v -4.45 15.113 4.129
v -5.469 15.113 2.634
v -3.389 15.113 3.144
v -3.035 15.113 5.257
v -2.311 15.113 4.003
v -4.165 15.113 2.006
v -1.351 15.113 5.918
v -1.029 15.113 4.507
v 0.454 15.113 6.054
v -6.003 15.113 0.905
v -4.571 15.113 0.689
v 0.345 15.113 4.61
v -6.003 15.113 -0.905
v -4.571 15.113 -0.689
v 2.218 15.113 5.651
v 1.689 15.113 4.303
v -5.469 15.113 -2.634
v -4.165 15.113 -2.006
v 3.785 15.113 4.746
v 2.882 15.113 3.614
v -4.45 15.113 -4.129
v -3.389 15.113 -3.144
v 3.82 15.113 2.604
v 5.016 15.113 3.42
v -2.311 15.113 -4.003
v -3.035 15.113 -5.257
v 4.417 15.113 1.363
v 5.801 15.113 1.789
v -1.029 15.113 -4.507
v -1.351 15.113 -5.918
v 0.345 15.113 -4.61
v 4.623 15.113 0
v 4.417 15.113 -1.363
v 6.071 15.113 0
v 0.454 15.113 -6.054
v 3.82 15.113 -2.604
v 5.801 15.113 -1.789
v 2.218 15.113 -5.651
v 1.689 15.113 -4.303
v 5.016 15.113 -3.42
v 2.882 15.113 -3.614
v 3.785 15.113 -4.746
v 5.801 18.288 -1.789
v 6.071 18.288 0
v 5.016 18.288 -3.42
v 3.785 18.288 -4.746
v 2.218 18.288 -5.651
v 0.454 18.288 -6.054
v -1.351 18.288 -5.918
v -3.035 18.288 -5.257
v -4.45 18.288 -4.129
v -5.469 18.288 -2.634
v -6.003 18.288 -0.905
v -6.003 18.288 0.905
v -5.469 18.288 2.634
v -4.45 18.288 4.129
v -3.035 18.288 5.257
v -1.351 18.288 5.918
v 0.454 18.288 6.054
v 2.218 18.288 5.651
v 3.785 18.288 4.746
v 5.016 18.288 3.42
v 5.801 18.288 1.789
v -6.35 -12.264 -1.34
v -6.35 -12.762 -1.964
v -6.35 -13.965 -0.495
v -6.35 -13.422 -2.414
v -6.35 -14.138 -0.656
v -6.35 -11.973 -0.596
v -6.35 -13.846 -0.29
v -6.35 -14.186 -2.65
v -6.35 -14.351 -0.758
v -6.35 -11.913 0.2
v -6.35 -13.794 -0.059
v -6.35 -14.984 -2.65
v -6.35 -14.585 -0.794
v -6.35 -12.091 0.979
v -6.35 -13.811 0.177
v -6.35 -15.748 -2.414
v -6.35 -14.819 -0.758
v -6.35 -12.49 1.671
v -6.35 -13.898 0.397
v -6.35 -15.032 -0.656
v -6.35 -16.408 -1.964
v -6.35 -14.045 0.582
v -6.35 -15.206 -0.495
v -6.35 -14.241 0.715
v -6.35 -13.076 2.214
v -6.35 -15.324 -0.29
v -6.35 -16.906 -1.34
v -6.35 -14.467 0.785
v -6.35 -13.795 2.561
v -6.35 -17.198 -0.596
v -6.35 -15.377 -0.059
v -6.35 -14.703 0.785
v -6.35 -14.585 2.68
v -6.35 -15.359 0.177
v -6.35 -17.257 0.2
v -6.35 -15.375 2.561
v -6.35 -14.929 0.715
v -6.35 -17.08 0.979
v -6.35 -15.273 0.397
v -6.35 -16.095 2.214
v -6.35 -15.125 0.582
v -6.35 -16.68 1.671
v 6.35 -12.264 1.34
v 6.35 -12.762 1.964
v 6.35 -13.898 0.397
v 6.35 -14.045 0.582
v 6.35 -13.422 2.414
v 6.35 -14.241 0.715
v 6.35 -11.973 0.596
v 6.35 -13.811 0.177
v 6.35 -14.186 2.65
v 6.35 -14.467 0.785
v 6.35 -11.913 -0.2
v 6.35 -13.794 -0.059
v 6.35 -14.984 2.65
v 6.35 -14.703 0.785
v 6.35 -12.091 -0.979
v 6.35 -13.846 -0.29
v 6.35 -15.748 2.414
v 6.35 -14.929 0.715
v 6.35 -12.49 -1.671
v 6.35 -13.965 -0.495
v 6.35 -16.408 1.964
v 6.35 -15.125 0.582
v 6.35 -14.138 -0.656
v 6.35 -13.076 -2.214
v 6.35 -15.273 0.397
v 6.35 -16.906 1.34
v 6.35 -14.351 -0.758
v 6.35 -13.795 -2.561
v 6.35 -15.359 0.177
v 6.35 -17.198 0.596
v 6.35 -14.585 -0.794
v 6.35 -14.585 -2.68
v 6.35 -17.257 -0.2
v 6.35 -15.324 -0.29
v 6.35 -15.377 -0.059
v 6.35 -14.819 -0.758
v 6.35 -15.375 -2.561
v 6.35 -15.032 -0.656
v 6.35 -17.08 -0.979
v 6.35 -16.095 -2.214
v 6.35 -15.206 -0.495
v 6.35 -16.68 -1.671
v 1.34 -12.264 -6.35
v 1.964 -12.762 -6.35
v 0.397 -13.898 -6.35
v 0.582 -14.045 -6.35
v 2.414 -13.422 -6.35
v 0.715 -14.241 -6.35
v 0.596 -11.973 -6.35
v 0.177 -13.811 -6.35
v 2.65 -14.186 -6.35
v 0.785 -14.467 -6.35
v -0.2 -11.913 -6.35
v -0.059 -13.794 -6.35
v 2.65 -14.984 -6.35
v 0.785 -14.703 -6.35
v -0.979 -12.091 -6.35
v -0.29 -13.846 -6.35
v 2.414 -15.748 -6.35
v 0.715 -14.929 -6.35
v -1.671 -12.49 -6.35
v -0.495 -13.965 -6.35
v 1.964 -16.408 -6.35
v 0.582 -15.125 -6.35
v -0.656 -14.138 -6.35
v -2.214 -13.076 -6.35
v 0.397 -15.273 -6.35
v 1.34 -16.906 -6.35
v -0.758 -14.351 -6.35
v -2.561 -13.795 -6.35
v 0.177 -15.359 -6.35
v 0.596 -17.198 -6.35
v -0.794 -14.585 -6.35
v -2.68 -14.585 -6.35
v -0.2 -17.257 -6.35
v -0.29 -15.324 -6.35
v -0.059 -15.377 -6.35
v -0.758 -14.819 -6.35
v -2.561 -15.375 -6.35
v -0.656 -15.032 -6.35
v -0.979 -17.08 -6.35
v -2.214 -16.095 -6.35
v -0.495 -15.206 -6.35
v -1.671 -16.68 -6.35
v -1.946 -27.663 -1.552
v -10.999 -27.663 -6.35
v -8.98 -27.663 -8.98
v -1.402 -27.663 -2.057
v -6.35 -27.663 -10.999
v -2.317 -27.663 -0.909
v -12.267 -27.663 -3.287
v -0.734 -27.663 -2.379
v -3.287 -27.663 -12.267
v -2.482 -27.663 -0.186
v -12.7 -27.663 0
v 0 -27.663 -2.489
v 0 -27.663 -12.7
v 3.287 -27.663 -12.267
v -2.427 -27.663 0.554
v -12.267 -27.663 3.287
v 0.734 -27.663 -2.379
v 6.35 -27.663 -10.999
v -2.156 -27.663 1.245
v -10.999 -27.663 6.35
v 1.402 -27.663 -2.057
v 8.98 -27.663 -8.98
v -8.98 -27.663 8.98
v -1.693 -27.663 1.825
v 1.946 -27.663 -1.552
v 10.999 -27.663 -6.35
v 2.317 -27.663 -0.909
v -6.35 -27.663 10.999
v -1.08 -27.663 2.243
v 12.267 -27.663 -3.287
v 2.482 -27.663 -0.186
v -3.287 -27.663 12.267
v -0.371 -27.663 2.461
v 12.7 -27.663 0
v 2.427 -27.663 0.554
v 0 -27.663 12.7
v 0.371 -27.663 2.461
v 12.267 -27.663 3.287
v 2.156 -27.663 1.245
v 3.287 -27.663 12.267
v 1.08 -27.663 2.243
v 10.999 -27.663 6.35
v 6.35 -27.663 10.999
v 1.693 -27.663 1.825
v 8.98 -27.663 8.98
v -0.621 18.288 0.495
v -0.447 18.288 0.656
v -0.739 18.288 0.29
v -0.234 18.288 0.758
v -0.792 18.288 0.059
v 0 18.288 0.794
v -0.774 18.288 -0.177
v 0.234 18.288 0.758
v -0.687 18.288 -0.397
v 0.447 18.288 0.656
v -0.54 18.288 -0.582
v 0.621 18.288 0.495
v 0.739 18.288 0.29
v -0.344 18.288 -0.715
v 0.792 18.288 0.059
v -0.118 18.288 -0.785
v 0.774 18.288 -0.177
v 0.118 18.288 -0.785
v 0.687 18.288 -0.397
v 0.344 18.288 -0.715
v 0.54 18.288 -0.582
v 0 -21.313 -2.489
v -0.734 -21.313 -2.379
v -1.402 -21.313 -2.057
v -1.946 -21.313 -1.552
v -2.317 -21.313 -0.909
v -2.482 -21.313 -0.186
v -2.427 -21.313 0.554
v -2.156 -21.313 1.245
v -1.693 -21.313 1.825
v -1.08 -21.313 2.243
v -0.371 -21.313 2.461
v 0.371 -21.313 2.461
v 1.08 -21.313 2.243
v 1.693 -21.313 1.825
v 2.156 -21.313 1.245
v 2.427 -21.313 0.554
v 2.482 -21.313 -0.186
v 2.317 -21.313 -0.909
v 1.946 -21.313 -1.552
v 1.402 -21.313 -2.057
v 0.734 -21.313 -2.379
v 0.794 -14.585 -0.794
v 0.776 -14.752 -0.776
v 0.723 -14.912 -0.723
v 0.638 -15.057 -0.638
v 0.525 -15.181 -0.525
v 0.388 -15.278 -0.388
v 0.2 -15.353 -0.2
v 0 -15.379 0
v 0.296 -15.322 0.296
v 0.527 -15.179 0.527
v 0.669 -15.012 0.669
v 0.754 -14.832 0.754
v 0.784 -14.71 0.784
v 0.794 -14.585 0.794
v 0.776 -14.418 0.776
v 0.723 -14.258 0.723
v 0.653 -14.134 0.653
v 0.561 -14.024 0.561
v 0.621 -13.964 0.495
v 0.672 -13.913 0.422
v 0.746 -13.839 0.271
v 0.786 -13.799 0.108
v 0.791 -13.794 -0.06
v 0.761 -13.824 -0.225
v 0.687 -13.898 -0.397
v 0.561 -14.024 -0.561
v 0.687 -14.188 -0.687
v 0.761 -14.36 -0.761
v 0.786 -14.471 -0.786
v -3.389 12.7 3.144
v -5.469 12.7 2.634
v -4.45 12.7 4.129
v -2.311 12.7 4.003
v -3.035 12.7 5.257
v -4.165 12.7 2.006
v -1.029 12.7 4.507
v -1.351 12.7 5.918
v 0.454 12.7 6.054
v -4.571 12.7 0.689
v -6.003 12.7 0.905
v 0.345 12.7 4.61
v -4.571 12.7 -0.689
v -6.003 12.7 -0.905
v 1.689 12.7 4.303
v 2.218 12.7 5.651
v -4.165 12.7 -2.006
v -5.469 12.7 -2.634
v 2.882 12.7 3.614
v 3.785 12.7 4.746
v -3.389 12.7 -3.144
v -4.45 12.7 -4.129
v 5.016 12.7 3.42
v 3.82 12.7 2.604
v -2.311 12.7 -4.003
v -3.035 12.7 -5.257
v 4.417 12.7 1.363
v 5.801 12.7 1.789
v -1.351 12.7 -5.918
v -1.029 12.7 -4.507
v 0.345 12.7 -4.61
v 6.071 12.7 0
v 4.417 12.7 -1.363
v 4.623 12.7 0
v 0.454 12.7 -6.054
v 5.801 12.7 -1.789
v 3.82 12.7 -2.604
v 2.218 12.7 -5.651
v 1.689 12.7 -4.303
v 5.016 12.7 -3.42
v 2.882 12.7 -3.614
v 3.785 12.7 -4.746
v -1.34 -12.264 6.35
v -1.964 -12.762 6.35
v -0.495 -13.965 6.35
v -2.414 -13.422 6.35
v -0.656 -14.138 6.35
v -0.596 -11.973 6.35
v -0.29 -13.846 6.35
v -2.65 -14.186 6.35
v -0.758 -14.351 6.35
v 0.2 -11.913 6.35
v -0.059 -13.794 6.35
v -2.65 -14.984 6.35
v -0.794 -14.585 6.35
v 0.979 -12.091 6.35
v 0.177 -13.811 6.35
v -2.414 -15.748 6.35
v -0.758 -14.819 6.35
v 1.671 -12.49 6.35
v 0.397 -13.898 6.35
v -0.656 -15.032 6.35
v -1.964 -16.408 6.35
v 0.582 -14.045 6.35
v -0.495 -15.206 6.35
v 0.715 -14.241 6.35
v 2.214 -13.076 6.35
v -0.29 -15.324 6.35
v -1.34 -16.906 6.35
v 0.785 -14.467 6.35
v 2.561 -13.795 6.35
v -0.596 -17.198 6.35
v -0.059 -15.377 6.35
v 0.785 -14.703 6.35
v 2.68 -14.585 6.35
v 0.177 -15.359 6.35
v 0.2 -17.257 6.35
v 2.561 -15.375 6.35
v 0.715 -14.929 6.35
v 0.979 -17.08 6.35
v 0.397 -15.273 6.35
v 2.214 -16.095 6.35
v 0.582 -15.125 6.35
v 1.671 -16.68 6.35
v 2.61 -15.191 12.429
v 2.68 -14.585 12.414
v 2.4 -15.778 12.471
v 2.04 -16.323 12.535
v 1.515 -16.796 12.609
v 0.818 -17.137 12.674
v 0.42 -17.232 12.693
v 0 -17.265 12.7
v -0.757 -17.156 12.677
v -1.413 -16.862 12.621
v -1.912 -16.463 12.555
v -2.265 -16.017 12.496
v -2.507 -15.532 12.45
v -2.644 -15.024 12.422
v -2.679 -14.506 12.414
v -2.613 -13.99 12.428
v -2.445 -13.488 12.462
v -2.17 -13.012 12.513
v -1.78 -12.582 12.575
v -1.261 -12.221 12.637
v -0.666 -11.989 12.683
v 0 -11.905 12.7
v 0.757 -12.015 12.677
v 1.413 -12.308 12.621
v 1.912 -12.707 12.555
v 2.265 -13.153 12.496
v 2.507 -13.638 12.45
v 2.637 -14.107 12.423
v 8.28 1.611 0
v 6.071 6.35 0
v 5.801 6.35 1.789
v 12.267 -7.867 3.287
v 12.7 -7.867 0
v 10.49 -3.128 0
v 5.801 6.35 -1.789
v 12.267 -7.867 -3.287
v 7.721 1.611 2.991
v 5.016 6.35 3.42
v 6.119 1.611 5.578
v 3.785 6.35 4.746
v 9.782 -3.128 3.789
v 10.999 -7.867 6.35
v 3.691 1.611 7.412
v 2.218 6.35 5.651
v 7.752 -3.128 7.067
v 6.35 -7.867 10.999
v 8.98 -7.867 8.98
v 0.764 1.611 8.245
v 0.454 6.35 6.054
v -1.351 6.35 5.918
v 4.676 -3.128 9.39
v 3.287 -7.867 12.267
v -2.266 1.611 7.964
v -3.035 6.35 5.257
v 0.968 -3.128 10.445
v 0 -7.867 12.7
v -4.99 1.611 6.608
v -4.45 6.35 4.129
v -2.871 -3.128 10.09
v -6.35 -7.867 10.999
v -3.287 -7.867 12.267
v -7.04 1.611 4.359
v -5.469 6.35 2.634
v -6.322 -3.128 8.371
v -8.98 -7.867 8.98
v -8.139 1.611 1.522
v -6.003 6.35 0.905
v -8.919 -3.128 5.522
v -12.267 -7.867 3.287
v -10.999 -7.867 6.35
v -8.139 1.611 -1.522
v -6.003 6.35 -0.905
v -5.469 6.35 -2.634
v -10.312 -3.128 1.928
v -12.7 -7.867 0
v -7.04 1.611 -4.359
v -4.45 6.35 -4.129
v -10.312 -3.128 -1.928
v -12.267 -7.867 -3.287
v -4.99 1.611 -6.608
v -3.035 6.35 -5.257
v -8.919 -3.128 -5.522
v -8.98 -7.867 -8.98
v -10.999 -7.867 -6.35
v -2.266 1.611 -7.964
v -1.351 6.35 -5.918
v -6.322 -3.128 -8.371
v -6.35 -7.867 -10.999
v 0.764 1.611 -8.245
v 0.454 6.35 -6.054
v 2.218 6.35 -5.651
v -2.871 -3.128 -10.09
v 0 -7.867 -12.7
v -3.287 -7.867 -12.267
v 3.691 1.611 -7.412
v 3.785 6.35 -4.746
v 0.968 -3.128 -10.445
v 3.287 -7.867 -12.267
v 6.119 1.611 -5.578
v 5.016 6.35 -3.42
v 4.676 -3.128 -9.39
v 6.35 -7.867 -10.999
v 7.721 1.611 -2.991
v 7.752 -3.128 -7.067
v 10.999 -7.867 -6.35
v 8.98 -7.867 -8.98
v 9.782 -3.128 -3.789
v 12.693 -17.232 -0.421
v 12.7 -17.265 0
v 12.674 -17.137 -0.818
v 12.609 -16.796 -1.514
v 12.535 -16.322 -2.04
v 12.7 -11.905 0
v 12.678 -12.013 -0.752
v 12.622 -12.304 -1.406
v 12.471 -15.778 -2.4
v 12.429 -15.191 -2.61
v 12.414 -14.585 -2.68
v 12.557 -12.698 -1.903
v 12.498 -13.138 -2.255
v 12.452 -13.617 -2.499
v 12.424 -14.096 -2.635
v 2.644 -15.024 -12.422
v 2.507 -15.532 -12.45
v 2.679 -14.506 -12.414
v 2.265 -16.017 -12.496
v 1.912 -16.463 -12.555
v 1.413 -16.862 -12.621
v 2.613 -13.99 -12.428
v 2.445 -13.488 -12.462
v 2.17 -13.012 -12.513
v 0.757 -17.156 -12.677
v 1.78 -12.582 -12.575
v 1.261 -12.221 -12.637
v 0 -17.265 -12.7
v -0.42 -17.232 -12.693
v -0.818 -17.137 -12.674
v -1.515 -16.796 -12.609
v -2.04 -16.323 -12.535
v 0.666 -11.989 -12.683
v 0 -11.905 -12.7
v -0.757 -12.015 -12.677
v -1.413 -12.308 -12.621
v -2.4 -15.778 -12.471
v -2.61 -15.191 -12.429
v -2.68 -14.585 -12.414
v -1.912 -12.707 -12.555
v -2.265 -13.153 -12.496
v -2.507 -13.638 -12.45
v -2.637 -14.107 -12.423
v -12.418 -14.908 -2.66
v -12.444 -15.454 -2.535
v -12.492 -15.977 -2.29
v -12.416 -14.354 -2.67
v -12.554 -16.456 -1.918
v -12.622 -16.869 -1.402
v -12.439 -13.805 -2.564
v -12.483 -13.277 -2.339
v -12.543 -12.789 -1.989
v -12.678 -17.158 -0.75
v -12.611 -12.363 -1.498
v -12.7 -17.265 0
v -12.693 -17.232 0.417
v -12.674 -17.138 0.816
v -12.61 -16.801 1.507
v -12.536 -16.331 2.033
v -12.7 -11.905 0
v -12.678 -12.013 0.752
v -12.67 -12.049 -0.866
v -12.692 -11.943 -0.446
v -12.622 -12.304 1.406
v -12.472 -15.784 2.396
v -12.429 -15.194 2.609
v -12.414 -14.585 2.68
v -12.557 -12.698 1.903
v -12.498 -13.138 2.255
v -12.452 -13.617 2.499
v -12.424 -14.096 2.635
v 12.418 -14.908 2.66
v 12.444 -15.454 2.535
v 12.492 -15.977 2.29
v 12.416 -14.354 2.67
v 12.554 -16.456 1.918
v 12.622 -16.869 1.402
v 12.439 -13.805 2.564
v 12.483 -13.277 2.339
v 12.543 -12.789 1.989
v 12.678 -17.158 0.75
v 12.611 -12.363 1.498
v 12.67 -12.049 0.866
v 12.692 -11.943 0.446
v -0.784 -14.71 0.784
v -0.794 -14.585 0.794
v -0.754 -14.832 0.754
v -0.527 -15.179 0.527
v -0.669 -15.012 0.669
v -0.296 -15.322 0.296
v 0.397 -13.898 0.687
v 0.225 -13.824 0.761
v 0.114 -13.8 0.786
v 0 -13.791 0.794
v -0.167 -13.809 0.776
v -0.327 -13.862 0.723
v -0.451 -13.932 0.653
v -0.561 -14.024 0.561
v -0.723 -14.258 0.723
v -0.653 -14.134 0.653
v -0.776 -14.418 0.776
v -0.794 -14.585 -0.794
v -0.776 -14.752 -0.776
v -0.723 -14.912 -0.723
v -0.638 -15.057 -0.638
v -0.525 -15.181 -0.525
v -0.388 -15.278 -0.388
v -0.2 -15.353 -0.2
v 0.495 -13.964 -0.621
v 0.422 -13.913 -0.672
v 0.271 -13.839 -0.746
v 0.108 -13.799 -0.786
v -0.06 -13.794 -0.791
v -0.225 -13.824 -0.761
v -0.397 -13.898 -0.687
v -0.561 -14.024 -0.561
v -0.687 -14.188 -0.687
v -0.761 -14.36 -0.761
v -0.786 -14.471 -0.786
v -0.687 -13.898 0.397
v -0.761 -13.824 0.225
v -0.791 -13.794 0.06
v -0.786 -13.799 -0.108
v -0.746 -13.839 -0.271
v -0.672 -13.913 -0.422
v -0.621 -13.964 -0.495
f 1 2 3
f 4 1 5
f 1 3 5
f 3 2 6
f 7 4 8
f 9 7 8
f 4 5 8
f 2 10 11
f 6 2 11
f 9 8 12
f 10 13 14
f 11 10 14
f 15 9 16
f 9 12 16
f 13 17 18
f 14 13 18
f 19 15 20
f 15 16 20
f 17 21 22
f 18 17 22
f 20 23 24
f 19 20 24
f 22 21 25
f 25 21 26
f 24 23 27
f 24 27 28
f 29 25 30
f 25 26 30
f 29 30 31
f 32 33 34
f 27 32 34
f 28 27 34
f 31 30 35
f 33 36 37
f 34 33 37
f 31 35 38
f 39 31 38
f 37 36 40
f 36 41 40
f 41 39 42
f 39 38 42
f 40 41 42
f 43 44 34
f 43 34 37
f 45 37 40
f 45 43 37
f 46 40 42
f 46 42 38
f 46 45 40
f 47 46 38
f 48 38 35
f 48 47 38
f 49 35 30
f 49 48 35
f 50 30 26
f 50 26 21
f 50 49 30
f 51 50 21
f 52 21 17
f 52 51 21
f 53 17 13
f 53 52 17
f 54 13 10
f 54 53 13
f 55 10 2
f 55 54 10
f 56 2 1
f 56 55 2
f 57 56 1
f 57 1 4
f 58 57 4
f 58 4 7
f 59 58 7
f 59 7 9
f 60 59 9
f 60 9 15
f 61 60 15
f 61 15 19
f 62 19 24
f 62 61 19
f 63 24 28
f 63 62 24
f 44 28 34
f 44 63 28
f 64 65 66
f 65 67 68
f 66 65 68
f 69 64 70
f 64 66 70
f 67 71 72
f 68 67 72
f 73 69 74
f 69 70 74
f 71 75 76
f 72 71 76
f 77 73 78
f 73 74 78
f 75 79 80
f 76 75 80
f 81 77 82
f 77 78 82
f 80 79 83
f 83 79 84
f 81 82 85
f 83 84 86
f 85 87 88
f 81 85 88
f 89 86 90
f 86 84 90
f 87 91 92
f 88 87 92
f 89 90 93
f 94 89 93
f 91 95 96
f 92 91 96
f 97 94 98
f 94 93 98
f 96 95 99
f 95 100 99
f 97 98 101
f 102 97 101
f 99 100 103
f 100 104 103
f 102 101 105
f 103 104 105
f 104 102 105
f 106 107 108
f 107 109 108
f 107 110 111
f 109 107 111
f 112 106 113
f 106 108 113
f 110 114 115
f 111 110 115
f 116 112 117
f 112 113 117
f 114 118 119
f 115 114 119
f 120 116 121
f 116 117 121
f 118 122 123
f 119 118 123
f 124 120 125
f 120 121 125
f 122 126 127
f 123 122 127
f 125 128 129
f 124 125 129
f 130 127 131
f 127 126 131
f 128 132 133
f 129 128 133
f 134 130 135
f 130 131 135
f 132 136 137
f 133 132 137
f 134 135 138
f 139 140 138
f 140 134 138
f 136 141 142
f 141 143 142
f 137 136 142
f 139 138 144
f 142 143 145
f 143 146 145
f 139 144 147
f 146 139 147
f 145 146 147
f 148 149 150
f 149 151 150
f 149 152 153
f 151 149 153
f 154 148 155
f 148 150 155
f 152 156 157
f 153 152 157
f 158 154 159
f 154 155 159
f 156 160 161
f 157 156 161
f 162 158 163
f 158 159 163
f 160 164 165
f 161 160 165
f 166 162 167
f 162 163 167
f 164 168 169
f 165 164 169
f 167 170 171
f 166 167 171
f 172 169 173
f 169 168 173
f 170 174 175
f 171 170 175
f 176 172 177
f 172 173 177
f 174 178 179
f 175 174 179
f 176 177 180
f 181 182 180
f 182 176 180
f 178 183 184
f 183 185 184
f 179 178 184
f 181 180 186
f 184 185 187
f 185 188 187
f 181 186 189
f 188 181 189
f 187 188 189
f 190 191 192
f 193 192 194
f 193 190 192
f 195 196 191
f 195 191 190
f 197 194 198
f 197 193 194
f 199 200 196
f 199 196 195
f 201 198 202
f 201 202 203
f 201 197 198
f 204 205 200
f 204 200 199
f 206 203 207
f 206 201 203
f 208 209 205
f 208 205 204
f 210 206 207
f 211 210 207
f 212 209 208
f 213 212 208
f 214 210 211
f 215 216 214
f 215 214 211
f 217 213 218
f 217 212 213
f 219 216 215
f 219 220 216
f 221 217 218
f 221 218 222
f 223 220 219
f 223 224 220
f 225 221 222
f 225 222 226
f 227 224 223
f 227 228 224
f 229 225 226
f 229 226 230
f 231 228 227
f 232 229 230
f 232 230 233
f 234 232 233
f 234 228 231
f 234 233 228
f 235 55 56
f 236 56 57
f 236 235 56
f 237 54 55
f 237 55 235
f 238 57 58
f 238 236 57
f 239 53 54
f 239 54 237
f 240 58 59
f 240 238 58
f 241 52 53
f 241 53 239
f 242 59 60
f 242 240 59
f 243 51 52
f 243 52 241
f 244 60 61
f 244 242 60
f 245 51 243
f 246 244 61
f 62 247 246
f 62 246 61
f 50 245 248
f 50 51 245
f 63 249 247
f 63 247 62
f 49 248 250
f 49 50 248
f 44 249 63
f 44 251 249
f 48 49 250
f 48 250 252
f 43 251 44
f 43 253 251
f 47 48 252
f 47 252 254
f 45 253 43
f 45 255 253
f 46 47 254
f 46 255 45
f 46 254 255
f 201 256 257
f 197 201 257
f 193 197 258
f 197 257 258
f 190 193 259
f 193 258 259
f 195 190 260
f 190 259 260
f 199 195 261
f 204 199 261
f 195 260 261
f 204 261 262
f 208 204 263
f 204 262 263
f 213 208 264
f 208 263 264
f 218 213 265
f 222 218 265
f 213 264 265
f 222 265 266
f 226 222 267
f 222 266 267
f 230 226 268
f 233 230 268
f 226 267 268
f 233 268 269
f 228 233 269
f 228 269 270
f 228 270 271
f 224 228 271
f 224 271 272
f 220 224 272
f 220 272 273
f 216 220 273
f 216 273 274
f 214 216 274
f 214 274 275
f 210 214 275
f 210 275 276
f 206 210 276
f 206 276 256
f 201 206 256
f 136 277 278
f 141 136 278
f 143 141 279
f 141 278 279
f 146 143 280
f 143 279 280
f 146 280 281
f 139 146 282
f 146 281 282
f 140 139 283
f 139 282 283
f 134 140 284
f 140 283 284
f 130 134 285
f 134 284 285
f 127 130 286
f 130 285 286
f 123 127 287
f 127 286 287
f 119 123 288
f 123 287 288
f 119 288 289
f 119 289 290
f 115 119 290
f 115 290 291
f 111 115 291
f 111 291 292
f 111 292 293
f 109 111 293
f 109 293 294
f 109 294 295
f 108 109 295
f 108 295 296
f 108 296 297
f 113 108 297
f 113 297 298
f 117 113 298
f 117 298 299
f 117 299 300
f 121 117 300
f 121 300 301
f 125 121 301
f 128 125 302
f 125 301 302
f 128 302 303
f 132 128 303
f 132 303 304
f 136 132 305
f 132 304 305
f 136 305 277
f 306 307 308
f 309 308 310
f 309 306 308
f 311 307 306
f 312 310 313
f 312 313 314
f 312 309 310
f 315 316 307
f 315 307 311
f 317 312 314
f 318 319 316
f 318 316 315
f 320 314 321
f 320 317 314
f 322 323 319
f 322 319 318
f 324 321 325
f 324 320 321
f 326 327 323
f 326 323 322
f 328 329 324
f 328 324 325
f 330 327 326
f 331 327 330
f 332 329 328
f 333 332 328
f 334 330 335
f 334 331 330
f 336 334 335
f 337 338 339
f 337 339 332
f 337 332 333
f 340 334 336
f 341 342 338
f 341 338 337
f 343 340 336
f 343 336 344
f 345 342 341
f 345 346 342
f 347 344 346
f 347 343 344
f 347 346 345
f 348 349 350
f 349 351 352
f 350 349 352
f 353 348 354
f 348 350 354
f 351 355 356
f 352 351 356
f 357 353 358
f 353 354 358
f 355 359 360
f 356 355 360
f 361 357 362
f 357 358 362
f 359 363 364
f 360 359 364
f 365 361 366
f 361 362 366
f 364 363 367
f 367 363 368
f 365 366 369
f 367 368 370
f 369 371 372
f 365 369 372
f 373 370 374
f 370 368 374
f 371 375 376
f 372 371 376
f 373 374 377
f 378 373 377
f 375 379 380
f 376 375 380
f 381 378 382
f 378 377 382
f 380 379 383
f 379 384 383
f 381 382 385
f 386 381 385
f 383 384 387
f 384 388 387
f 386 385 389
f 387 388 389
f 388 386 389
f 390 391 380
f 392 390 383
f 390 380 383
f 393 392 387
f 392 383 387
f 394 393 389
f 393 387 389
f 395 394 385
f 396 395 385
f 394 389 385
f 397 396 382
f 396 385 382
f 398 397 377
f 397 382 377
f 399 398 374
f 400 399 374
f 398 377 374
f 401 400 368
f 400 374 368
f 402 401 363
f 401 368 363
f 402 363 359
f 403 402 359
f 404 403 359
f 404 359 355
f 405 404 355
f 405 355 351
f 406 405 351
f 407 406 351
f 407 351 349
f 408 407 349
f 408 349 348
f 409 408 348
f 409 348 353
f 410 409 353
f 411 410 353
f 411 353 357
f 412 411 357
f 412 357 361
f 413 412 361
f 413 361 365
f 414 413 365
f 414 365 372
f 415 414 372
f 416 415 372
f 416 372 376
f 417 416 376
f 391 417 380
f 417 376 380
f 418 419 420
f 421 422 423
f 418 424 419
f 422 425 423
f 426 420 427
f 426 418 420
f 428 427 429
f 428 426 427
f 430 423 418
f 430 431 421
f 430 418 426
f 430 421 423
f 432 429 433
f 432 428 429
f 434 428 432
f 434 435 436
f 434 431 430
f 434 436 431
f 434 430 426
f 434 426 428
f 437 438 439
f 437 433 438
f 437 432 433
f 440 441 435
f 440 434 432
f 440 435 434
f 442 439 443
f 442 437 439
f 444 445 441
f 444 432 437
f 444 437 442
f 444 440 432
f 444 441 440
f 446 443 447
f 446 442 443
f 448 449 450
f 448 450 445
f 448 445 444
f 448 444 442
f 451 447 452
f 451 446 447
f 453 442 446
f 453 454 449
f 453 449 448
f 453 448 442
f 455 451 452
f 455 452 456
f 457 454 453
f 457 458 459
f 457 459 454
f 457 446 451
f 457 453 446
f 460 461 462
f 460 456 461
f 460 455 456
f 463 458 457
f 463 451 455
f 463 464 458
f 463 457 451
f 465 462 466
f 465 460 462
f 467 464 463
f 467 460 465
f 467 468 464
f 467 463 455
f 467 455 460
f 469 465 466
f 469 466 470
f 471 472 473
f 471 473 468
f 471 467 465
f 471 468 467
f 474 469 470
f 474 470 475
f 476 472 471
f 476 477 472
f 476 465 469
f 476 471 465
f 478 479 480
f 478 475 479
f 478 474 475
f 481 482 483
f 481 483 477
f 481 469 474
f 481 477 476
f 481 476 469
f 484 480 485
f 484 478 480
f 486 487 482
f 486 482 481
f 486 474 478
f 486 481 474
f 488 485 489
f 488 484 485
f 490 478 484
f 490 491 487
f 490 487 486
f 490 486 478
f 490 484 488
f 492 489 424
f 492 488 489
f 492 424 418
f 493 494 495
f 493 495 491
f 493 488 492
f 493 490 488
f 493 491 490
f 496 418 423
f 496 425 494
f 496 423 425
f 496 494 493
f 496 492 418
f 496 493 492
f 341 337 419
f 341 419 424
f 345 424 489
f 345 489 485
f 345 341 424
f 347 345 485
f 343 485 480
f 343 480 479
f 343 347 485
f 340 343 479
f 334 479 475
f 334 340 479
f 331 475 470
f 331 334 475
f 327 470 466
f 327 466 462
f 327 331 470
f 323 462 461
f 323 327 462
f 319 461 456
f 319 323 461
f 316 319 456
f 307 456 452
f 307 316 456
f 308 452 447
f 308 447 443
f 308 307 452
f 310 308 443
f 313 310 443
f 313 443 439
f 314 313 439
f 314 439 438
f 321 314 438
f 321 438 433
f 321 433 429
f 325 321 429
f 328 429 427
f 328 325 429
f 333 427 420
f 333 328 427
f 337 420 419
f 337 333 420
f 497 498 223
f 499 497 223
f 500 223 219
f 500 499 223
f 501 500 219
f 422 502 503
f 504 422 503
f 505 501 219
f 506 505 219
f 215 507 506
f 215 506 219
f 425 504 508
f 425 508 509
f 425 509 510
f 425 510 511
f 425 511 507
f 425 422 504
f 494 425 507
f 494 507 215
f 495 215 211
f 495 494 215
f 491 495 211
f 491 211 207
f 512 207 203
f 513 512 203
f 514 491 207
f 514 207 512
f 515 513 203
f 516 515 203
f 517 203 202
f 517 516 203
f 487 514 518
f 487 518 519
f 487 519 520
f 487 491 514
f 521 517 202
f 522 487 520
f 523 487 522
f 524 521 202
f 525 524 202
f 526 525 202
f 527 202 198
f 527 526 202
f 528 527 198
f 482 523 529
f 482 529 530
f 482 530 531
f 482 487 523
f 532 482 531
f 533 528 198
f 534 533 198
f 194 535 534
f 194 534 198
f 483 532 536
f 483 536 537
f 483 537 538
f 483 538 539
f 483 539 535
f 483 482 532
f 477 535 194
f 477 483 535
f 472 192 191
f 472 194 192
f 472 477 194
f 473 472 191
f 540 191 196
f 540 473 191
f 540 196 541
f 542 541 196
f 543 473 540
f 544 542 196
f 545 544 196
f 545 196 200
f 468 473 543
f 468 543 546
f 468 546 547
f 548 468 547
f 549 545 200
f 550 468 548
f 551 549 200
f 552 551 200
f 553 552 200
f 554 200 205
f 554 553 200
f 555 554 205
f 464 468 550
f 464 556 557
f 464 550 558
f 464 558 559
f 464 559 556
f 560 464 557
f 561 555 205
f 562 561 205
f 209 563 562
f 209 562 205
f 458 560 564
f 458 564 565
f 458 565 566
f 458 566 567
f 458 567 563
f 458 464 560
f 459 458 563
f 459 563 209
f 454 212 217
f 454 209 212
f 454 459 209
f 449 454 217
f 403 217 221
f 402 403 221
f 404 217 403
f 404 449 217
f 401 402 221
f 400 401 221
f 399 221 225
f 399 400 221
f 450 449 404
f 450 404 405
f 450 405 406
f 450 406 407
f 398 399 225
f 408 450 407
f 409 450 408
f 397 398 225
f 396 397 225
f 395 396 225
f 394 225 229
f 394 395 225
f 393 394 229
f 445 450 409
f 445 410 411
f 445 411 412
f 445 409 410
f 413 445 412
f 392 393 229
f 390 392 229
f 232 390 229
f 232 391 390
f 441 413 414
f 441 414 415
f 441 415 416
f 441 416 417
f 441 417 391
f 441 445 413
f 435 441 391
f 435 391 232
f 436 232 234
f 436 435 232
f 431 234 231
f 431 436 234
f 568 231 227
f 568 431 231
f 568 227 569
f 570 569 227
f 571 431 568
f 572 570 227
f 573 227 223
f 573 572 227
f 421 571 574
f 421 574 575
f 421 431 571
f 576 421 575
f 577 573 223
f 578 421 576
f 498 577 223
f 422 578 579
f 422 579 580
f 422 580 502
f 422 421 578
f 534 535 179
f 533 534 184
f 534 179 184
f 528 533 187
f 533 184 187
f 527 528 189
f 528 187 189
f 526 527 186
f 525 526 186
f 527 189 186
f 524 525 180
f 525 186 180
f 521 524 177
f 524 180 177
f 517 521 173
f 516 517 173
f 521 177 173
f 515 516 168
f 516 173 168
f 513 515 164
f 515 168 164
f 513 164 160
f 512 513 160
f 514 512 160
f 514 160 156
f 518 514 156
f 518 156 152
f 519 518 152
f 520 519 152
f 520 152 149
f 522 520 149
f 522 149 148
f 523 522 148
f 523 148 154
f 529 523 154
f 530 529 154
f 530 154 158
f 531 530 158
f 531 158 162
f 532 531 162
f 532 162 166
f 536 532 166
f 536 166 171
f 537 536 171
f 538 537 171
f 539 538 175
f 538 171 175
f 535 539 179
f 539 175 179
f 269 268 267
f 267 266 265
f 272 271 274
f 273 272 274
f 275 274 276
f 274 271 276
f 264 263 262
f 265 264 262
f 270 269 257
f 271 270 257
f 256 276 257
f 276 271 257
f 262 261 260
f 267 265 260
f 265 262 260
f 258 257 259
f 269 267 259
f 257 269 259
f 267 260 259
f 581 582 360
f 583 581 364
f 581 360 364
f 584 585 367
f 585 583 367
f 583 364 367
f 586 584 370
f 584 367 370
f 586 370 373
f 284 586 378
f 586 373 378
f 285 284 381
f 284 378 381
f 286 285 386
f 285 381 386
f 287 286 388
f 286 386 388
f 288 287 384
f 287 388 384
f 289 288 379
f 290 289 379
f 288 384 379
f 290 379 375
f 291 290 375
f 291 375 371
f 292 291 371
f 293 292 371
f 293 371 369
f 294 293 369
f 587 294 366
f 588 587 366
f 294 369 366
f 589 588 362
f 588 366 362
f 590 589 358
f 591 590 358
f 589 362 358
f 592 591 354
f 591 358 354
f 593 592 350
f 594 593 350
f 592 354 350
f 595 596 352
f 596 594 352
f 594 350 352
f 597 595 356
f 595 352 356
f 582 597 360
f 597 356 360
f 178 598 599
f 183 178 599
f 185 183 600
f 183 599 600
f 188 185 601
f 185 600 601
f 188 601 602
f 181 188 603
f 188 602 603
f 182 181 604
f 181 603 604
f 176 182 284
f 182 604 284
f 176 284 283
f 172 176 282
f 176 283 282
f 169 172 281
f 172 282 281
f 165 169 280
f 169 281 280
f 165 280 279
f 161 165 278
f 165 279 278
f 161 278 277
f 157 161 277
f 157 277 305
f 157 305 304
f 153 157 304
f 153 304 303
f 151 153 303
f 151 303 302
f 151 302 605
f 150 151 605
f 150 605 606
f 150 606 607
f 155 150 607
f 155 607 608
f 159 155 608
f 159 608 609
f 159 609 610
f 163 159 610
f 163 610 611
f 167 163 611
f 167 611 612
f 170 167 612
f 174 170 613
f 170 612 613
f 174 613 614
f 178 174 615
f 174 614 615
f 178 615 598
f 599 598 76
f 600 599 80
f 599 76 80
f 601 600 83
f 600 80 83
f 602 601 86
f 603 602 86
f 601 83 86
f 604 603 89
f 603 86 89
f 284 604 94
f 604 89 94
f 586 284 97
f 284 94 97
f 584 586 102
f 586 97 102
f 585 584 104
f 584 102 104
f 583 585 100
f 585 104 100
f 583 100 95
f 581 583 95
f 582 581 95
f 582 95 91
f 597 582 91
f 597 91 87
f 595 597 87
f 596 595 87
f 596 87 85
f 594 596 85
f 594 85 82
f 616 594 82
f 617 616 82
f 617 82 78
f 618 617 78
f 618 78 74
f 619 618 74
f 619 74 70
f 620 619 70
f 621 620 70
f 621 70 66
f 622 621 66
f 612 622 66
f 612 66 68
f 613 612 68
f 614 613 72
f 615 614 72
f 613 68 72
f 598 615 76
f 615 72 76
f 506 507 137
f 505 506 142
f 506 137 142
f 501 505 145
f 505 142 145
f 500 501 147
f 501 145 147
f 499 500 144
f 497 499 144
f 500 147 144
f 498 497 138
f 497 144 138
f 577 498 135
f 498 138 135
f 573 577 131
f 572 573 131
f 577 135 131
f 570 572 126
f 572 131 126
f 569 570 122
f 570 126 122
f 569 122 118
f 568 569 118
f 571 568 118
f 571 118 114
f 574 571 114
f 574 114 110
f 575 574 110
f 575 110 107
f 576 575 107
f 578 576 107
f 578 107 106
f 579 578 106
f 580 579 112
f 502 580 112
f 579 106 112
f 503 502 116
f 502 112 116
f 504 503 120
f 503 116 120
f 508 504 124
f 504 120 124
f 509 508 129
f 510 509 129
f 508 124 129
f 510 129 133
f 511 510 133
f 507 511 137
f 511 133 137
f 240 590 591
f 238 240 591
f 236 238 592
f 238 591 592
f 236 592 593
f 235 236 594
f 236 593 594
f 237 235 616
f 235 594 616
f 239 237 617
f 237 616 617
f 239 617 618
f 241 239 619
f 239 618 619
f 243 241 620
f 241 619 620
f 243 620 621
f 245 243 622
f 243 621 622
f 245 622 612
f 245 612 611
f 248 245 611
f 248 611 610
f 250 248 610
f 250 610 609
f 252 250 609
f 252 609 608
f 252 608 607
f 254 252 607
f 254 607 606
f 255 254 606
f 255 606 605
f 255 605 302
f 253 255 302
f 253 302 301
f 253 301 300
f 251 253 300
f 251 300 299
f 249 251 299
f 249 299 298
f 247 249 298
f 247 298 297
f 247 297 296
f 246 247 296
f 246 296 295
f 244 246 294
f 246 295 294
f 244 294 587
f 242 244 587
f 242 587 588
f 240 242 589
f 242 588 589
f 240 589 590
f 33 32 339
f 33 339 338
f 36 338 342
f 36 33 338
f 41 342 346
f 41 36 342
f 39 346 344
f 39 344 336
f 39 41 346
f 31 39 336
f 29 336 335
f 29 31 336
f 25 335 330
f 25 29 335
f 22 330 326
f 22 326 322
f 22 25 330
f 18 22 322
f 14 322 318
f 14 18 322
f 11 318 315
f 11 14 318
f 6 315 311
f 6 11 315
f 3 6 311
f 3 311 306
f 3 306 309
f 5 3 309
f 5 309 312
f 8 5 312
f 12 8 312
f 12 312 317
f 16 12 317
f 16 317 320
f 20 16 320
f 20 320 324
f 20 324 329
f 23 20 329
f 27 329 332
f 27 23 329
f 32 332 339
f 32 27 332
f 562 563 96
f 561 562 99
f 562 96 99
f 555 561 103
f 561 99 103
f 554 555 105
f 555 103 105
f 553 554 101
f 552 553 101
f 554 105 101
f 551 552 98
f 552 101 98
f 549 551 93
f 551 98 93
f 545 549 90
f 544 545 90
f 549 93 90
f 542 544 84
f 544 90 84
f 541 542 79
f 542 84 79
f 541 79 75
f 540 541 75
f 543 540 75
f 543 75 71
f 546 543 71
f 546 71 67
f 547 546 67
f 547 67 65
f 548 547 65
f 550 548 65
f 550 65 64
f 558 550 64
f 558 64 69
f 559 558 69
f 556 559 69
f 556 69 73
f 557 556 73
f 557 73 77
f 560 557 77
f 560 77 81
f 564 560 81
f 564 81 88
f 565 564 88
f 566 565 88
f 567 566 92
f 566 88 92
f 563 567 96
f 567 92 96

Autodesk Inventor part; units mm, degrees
ref_plane "YZ Plane" through (0, 0, 0) normal (1, 0, 0) x (0, 1, 0)
ref_plane "XZ Plane" through (0, 0, 0) normal (0, 1, 0) x (-1, 0, 0)
ref_plane "XY Plane" through (0, 0, 0) normal (0, 0, 1) x (1, 0, 0)
sketch "Sketch1" plane through (0, 0, 0) normal (0, 0, 1) x (1, 0, 0)
  line L0 (0, 0) -> (6.0706, 0)
  line L1 (6.0706, 0) -> (6.0706, 12.7)
  line L2 (6.0706, 12.7) -> (4.6228, 12.7)
  line L3 (4.6228, 12.7) -> (4.6228, 15.113)
  line L4 (4.6228, 15.113) -> (6.0706, 15.113)
  line L5 (6.0706, 15.113) -> (6.0706, 18.288)
  line L6 (6.0706, 18.288) -> (0, 18.288)
  line L7 (0, 18.288) -> (0, 0)
  line L8 (0, -29.2334) -> (0, 26.2082) projected
  line L9 (6.0706, 0) -> (6.0706, 6.35)
  line L10 (6.0706, 0) -> (6.0706, 6.35)
  line L11 (6.0706, 6.35) -> (13.048, -8.6131)
  line L12 (6.0706, 6.35) -> (22.5806, 6.35) construction
  line L13 (13.048, -8.6131) -> (9.873, -8.6131)
  line L14 (9.873, -8.6131) -> (6.0706, 0)
  line L15 (13.048, -8.6131) -> (0, -8.6131)
  line L16 (0, 0) -> (6.0706, 0)
  line L17 (0, -8.6131) -> (12.7, -8.6131)
  line L18 (12.7, -8.6131) -> (12.7, -21.3131)
  line L19 (12.7, -21.3131) -> (0, -21.3131)
  line L20 (0, -21.3131) -> (0, -8.6131)
  line L21 (12.7, -8.6131) -> (12.7, -7.8668)
  dimension "d0" = 6.0706
  dimension "d1" = 12.7
  dimension "d2" = 90
  dimension "d3" = 1.4478
  dimension "d4" = 2.413
  dimension "d5" = 3.175
  dimension "d23" = 16.51
  dimension "d24" = 65
  dimension "d25" = 3.175
  dimension "d83" = 12.7
  dimension "d84" = 12.7
revolve "Revolution1" add sketch "Sketch1" angle 360 about axis through (0, -10, 0) along (0, 1, 0) contours L7 L6 L5 L4 L3 L2 L1 L0 | L0 L14 L15 L8 | L1 L11 L21 L13 L14 | L15 L13 L18 L19 L8
sketch "Sketch12" plane through (0, 18.288, 0) normal (0, 1, 0) x (1, 0, 0)
  point P0 (0, 0)
  point P1 (0, 0)
hole "Hole4" at (0, 18.288, 0) direction (0, -1, 0) diameter 1.5875 depth 32.8676 tip angle 118
sketch "Sketch13" plane through (0, -21.3131, 0) normal (0, -1, 0) x (1, 0, 0)
  circle A0 centre (0, 0) radius 12.7 projected
  point P0 (12.7, 0)
  point P1 (0, -12.7)
  point P2 (-12.7, 0)
  point P3 (0, 12.7)
ref_plane "Work Plane1" through (12.7, -21.3131, 0) normal (1, 0, 0) x (0, 1, 0)
sketch "Sketch14" plane through (12.7, -21.3131, 0) normal (1, 0, 0) x (0, 1, 0)
  line L0 (0, 12.7) -> (0, -12.7) projected
  line L1 (0, 0) -> (13.4463, 0)
  line L2 (13.4463, 12.7) -> (13.4463, -12.7) projected
  line L3 (13.4463, 0) -> (6.728, 0)
  point P0 (21.3131, 0)
  dimension "d92" = 6.7183
hole "Hole5" at (12.7, -14.5851, 0) direction (-1, 0, 0) diameter 1.5875 end through all
hole "Hole6" at (12.7, -14.5851, 0) direction (-1, 0, 0) diameter 5.3594 depth 6.35 thread size "1/4-28 UNF" class "2B" standard "ANSI Unified Screw Threads"
extrude "Extrusion3" add sketch "Sketch13" along normal blind 6.35
sketch "Sketch16" plane through (0, -27.6631, 0) normal (0, -1, 0) x (1, 0, 0)
  point P0 (0, 0)
hole "Hole8" at (0, -27.6631, 0) direction (0, 1, 0) diameter 4.9784 depth 6.35 thread size "1/4-20 UNC" class "2B" standard "ANSI Unified Screw Threads"
pattern_circular "Circular Pattern5" count 4 over 360 about axis through (0, -10, 0) along (0, 1, 0) of "Hole5", "Hole6"
equation "\"d54\" = 55deg"
equation "\"Sketch7_Pitch\" = 0.90714"
equation "\"d72\" = 55deg"
equation "\"Sketch9_Pitch\" = 1.27"
equation "\"d137\" = 55deg"
equation "\"Sketch17_Pitch\" = 1.27"
equation "\"d155\" = 55deg"
equation "\"Sketch19_Pitch\" = 0.90714"
equation "\"d173\" = 55deg"
equation "\"Sketch21_Pitch\" = 0.90714"
equation "\"d191\" = 55deg"
equation "\"Sketch23_Pitch\" = 1.27"
equation "\"d221\" = 55deg"
equation "\"Sketch25_Pitch\" = 0.90714"
equation "\"d239\" = 55deg"
equation "\"Sketch27_Pitch\" = 1.27"
properties part number "piston badflowchannel-1-16in-thread"
